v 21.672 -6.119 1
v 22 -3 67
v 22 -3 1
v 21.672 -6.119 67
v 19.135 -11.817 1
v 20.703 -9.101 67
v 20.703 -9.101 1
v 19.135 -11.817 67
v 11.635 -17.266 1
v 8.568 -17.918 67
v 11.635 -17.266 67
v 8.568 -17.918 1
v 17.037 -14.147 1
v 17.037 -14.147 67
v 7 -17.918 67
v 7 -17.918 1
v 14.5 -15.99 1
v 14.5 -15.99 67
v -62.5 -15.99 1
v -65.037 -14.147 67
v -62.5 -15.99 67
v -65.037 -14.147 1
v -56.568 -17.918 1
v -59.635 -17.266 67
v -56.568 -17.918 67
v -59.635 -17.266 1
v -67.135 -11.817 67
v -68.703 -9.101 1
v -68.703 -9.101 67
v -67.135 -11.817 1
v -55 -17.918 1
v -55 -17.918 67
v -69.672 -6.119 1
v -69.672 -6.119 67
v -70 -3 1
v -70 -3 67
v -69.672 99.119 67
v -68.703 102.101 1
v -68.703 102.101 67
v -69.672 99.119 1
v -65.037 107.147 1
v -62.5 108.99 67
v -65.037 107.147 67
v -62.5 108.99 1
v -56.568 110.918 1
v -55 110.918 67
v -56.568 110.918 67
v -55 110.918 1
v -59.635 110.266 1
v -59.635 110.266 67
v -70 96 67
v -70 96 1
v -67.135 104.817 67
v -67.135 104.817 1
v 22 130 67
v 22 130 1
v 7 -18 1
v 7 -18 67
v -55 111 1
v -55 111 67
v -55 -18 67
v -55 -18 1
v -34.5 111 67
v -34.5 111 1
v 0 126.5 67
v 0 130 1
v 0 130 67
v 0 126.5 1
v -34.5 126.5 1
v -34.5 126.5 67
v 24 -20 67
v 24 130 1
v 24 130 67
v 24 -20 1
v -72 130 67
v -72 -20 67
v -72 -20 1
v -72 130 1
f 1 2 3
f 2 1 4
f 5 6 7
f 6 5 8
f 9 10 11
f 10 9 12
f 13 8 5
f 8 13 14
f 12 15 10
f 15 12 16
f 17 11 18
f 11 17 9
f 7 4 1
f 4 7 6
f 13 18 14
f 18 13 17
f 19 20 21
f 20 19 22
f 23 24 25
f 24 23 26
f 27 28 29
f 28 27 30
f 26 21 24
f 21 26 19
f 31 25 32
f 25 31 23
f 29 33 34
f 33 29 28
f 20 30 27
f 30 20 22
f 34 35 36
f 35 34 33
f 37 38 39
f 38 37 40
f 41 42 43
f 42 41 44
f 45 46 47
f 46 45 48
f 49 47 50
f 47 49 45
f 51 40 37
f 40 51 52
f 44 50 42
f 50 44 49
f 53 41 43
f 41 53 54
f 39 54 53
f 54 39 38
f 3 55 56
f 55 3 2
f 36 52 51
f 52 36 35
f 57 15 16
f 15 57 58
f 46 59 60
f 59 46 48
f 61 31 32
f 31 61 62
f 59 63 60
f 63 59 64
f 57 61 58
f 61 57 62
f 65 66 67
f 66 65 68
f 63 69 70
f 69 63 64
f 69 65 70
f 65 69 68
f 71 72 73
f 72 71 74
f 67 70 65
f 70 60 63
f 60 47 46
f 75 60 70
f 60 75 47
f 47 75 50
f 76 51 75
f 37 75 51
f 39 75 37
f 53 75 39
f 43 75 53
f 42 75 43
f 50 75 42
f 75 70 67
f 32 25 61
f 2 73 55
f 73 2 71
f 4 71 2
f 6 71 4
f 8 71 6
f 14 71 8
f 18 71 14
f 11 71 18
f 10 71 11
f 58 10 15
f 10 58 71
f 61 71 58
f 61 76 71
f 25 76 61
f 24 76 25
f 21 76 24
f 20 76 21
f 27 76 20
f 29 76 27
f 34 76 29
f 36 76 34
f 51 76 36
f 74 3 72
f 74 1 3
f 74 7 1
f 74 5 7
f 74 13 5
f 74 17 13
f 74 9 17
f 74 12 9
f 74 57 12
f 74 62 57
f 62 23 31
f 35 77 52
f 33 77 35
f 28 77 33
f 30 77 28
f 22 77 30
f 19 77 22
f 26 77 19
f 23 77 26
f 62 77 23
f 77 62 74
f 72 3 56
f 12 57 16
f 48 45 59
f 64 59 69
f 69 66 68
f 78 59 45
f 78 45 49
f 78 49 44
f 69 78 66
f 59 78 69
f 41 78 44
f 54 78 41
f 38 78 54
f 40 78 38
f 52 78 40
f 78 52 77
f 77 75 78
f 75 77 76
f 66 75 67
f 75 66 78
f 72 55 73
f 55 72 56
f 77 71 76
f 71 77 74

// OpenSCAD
// file: duct.scad
WALL_SIZE = .5;
RADIUS = 3;
DEFAULT_SIZE = [10, 10];
RRR = 0;
LAYER_HEIGHT = 0.2;

module reinforcementsLeft(size, radius, wallSize, parts = [1, 1]) {
  diameter = radius * 2;
  halfRadius = radius / 2;

  r = radius * 4;
  d1 = -halfRadius;
  d2 = -halfRadius;
  d3 = size[1] - r + halfRadius;
  
  if (parts[0])
    translate([d1, d2, 0])
      circle(d = radius * 4, $fn = 32);
      
  if (parts[1])
    translate([d1, d3, 0])
      circle(d = radius * 4, $fn = 32);
}

module reinforcementsRight(size, radius, wallSize, parts = [1, 1]) { 
  diameter = radius * 2;
  r = radius * 4;
  halfRadius = radius / 2;
  d2 = size[0] - r + halfRadius;
  d3 = size[1] - r + halfRadius; 
  d4 = -halfRadius;

  if (parts[0])
    translate([d2, d4, 0])
      circle(d = radius * 4, $fn = 32);
  
  if (parts[1])
    translate([d2, d3, 0])
      circle(d = radius * 4, $fn = 32);        
}

module reinforcements(size, radius, wallSize, parts = [1, 1, 1, 1]) {
  reinforcementsLeft(size, radius, wallSize, [parts[0], parts[1]]);
  reinforcementsRight(size, radius, wallSize, [parts[2], parts[3]]);
}

module duct2dEdge(
  size = DEFAULT_SIZE, 
  wallSize = WALL_SIZE, 
  radius = RADIUS, 
  outer = false, 
  parts = [1,1,1,1]
) {
  sizeX = size[0] + (outer ? wallSize * 2 : 0);
  sizeY = size[1] + (outer ? wallSize * 2 : 0);
  r = radius + (outer ? wallSize : 0);
  
  translate([sizeX / -2 + r * 2, sizeY / -2 + r * 2, 0]) {
    minkowski() {
      square([sizeX - (r * 2), sizeY - (r * 2)]);
      
      translate([-r, -r, 0])
        circle(r, $fn = 64);
    }
   
    if (outer) reinforcements([sizeX, sizeY], r, wallSize, parts = parts);
  }
}

module duct2d(
  size = DEFAULT_SIZE,
  wallSize = WALL_SIZE, 
  radius = RADIUS
) {
  difference() {
    duct2dEdge(
      size,
      wallSize,
      radius,
      outer = true
    );
    
    duct2dEdge(
      size, 
      wallSize,
      radius
    );
  }
}

module coupling2d(size = [10, 10], wallSize = WALL_SIZE, radius = RADIUS, inset = 0) {
  offset(r = -0.1) difference() {
      *duct2dEdge(
        [
          size[0] + wallSize * 2 + radius * 2.5, 
          size[1] + wallSize * 2 + radius * 2.5
        ], 
        wallSize,
        radius
      );
      
      duct2dEdge(
        [
          size[0] + wallSize * 2 - inset, 
          size[1] + wallSize * 2 - inset
        ], 
        wallSize,
        radius + wallSize,
        outer = true
      );
    }
}

module coupling(size = [10, 10], wallSize = WALL_SIZE, radius = RADIUS, h = 4) {
    split = 0.6;
    partHeight = (h - (LAYER_HEIGHT * 4)) / 2;

    difference() {
      linear_extrude(h) 
        offset(2) 
          coupling2d(size, wallSize, radius);
   
      translate([0, 0, -0.1])
        linear_extrude(partHeight + 0.2)
          coupling2d(size, wallSize, radius + 0.2);
       
      translate([0, 0, partHeight - 0.1]) 
        linear_extrude(LAYER_HEIGHT * 1 + 0.2)
          offset(-0.2)
            coupling2d(size, wallSize, radius + 0.2);
      
      translate([0, 0, partHeight - 0.1 + LAYER_HEIGHT]) 
        linear_extrude(LAYER_HEIGHT * 2 + 0.2)
          offset(-0.4)
            coupling2d(size, wallSize, radius + 0.2);
      
      translate([0, 0, partHeight + LAYER_HEIGHT + LAYER_HEIGHT + LAYER_HEIGHT - 0.1]) 
        linear_extrude(LAYER_HEIGHT * 1 + 0.2)
          offset(-0.2)
            coupling2d(size, wallSize, radius + 0.2);

      
      translate([0, 0, partHeight + (LAYER_HEIGHT * 4) - 0.1])
        linear_extrude(partHeight + (LAYER_HEIGHT * 4) + 0.1)
          coupling2d(size, wallSize, radius + 0.2);
    }
}

module ductTaper(
  startSize = DEFAULT_SIZE, 
  endSize = [DEFAULT_SIZE[0] - 2, DEFAULT_SIZE[1] - 2], 
  wallSize = WALL_SIZE, 
  radius = RADIUS, 
  h = 10,
  yPlus = 12,
  parts = [1,1,1,1]
) {
  upperY = startSize[1] / 2 - endSize[1] / 2;

  difference() {
    union() {
      intersection() {
        union() {
          linear_extrude(h)
            duct2dEdge(
              [
                startSize[0], 
                startSize[1]
              ],
              wallSize,
              radius + wallSize,
              outer = true,
              parts = parts
            );
        }
          
        hull() {
          translate([0, 0, -0.1]) 
            linear_extrude(0.2) 
              offset(2)
                duct2dEdge(startSize, wallSize, radius, parts);
          
          translate([0, upperY - yPlus / 2, h - 0.1]) 
            linear_extrude(0.2) 
              offset(2) 
                duct2dEdge(
                  [endSize[0], endSize[1] + yPlus], 
                  wallSize, 
                  radius - wallSize * 4,
                parts
                );
        }  
      }
        
      children();
    }
    
    hull() {
      translate([0, 0, -0.1]) 
        linear_extrude(0.2) duct2dEdge(startSize, wallSize, radius);
      
      translate([0, startSize[1] / 2 - endSize[1] / 2 - radius * .5, h - 0.1]) 
        linear_extrude(0.2) duct2dEdge(endSize, wallSize, radius);
    }
   
  } 

  translate([0,endSize[1] - radius * 2.5 + WALL_SIZE * 2, h])
    linear_extrude(5)
      duct2d(
        [
          endSize[0], 
          endSize[1]
        ],
        wallSize,
        radius,
        outer = true
      );
}

   
group() {

  translate([0, 32, 0]) {
    coupling([50, 20]);
    *coupling([40, 10]);
  }
  
  *translate([0, 0, 0]) {
    hull() {
      linear_extrude(1) 
        duct2d([40, 10]);
      
      translate([0, 5, 20]) linear_extrude(1) 
        duct2d([50, 20]);
    }
  }

  translate([0, -32, 0]) {
    rotate([0,0,0]) linear_extrude(8) duct2d([50, 40]);
  }
  
  *translate([0, -25, 0]) {
    linear_extrude(6) duct2d([50, 20]);
  }
  
  group() {
    ductTaper([50, 20], [40, 10], h = 15);
  }
  
  *translate([0, -30, -10]) 
    linear_extrude(15) duct2d([50 - WALL_SIZE * 2, 20 - WALL_SIZE * 2]);

  *translate([0, 25, -10]) 
    linear_extrude(15) duct2d([40 + WALL_SIZE * 2, 10 + WALL_SIZE * 2]);

  *  duct2d([50, 10]);
  *  translate([0,0,20]) duct2d([50, 10]);

  *square([50, 10], center = true);
}
// main file
use <./duct.scad>;
CORNER_RADIUS = 20;
WALL_SIZE = .5;
RADIUS = 3.5;
DEFAULT_SIZE = [10, 10];
SOLID = true;
WIDTH = 40;
HEIGHT = 20;
T_WIDTH = 5;
LW = 0.4;

FAN_SIZE = [92, 92, 18];
MAIN_SIZE = [105, 126, 34];
SINK_SIZE = [59, 67, 20];
SINK_Y = (MAIN_SIZE[1] - SINK_SIZE[1]) / 2;
SINK_Z = 5;
BASE_SIZE = [
  MAIN_SIZE[1],
  FAN_SIZE[2] + MAIN_SIZE[2] + SINK_SIZE[2]
];

echo(BASE_SIZE);

*group() {
  color("blue") 
    translate([-MAIN_SIZE[2], (MAIN_SIZE[1] - FAN_SIZE[1]) / 2, 5]) 
      rotate([0, 270, 0])
        cube(FAN_SIZE);
  
  color("silver")
    translate([SINK_SIZE[2], SINK_Y, SINK_Z]) 
      rotate([0, 270, 0])
        cube(SINK_SIZE);
  
  color("gray") 
      rotate([0, 270, 0]) 
        cube(MAIN_SIZE);
}

PADDING = 4;
HALF_PAD = PADDING / 2;
Y_GAP = 16;
FAN_X_GAP = 16;
CH = SINK_SIZE[0] + SINK_Z + PADDING;
CR = 15;

difference() {
  translate([
    -BASE_SIZE[1] + SINK_SIZE[2] - PADDING - FAN_X_GAP, 
    (BASE_SIZE[0] - MAIN_SIZE[1]) / -2 - PADDING - Y_GAP, 
    1
  ])
    cube([
      BASE_SIZE[1] + PADDING * 2 + FAN_X_GAP, 
      BASE_SIZE[0] + PADDING * 2 + Y_GAP, 
      CH - 2
    ]);

  union() {
    translate([
      SINK_SIZE[2] - CR + HALF_PAD, 
      CR - HALF_PAD -Y_GAP, 
      0
    ])
        cylinder(CH, d = CR * 2);
      
    translate([
      -MAIN_SIZE[0] + CR * 2 + PADDING + FAN_X_GAP, 
      CR - HALF_PAD -Y_GAP, 
      0
    ])
        cylinder(CH, d = CR * 2);
        
    translate([
      -MAIN_SIZE[0] + CR * 2 + PADDING + FAN_X_GAP, 
      MAIN_SIZE[1] - CR * 2, 
      0
     ])
      cylinder(CH, d = CR * 2);

    translate([
      -BASE_SIZE[1] + HALF_PAD, 
      -Y_GAP - HALF_PAD + CR, 
      0
    ])
      cube([
        BASE_SIZE[1] + PADDING + FAN_X_GAP, 
        BASE_SIZE[0] - Y_GAP - CR + PADDING, 
        CH
      ]);

        
    translate([
      -BASE_SIZE[1] + HALF_PAD + CR, 
      -Y_GAP - HALF_PAD, 
      0
    ])
      cube([
        BASE_SIZE[1] + PADDING + FAN_X_GAP - CR * 2, 
        BASE_SIZE[0] + Y_GAP - CR + PADDING / 2, 
        CH
      ]);
     
    cube([
      SINK_SIZE[2] + PADDING / 2, 
      BASE_SIZE[0] + PADDING + 0.1, 
      CH
    ]);
    
    translate([-MAIN_SIZE[2] - 0.5, 0.5, 0])
    cube([
      SINK_SIZE[2] + MAIN_SIZE[2] + PADDING / 2, 
      BASE_SIZE[0], 
      CH
    ]);
    
    translate([-1, SINK_Y - 1, -20]) 
      cube([
        SINK_SIZE[2] + 2, 
        SINK_SIZE[1] + 2, 
        SINK_SIZE[0]
      ]);
  }
}

*linear_extrude(MAIN_SIZE[1])
  ductSpiral(BASE_SIZE, CORNER_RADIUS, texture = true);
  
*ductTaper(
  BASE_SIZE, 
  10,
  CORNER_RADIUS
);

*rotate([0, 180, 0])
  translate([-BASE_SIZE[0], 0, -MAIN_SIZE[1]])
    ductTaper(
      BASE_SIZE, 
      10,
      CORNER_RADIUS
    );

module ductTaper(
  size = [WIDTH, HEIGHT], 
  h = 5, 
  th = 25,
  r = CORNER_RADIUS, 
  texture = false, 
  offset = LW * 2) 
{
  difference() {
    hull() {
      linear_extrude(h) 
        offset(offset) 
          ductSpiral(size, r, texture);
      
      translate([0, 0, h])
        linear_extrude(th) 
          offset(-3) 
            ductSpiral(size, r, texture);
    }
  }
}



curveScale = 0.13;
curveHeight = 40;
curveY = -3;

module dShape(
  d = 100,
  tY = curveY, 
  s1t = [-60, -115], 
  s2t = [-50, 47], 
  s1 = false, 
  s2 = false,
  $fn = 8
) {
  translate([0, tY, 0]) {
    difference() {
      circle(d = d, $fn = $fn);
      translate(s1t) square(abs(s1t[0] * 2));
      translate(s2t) square(s2 == false ? 100 : s2);
    }      
  }
}


module dTaper(d = 108, h = 40, s1t = false, s2t = false, topT = 0, fn = 16) {
  hull() {
    linear_extrude(1) {
      if (s1t == false && s2t == false) {
        dShape(d, $fn = fn);  
      } else {
        dShape(d, s1t = s1t, s2t = s2t, $fn = fn);  
      }
    }
    
    translate([(d / -2) + 20, topT, h - 1]) 
      linear_extrude(1) 
        square([d - 40, 3]);
  }
}

module fc() {
    // BOTTOM COUPLING
  linear_extrude(8) {
    diameter = RADIUS * 2;
    twoWall = WALL_SIZE * 2;
    
    difference() {
      // BOTTOM OUTER WALL
      union() {
        duct2dEdge([110, 50], WALL_SIZE, RADIUS, outer = true);      
        dShape(104, $fn = 16);
      }
      
      // BOTTOM INNER WALL
      group() {
        translate([0, RADIUS * -2 - WALL_SIZE + 7.5, 0]) {
          duct2dEdge([110, 50], WALL_SIZE, RADIUS);
        }

        dShape(99, curveY, [-50, -100], [-50, 44.5], s2 = [100, 22], $fn = 128);
      }
    }
  }
}


module fanCoupling() {
  fc();

  // TAPER
  translate([0, 0, 5]) {
    twoWall = WALL_SIZE * 2;
    
    // OUTER SHELL
    union() {
      rotate([0, 0, 180]) 
        translate([twoWall - 1, twoWall - 1, 0])
          ductTaper(
            [110, 50],  
            [80, 20],
            wallSize = WALL_SIZE,
            radius = 3,
            h = curveHeight,
            parts = [0,0,0,0]
          ) {
      
            // D TAPER
            rotate([0,0,180]) {
              linear_extrude(4) dShape(104, $fn = 16);
              translate([0,0, 4]) dTaper(104, 36, $fn = 8);
              
              linear_extrude(15) 
                translate([-55 + 7 + WALL_SIZE, -25 + 7 + WALL_SIZE, -5]) 
                  reinforcements(
                    [110 + WALL_SIZE * 2, 50 + WALL_SIZE* 2], 
                    3 + WALL_SIZE * 2, 
                    WALL_SIZE
                  );
            }
            
          }
    }
  }

  translate([20, 33, 0]) cylinder(5, d = 13);
  translate([00, 33, 0]) cylinder(5, d = 13);
  translate([-20, 33, 0]) cylinder(5, d = 13);
}

module defrostVent2d(wallSize = WALL_SIZE, solid = SOLID) {
  offset = 10;
  v1 = 30;
  v1y = 92 + offset;
  v2 = 60;
  v3y = 92 + offset;
  
  translate([0, 80, 0]) {
    translate([0, 0, 0]) {
      difference() {
        translate([-wallSize, -wallSize, 0]) 
          square([v1 + wallSize * 2, v1y + wallSize * 2]);

        if (!solid) translate([0, -wallSize * 2]) square([v1, v1y + wallSize * 2]);
      }

      translate([v1, 0, 0])
        difference() {
          difference() {
            circle(r = v1 + wallSize, $fn = 64);
            if (!solid) circle(r = v1, $fn = 64);
          }
          
          translate([-v1 - 10, 0]) square([v1 * 2 + 20, v1 * 2]);
          translate([wallSize, -v1 - 10]) square([v1 * 2, v1 * 2 + 20]);
        }
      }
    
    translate([v1 + wallSize, 0, 0]) {
      if (solid) {
        translate([0, -v1 - wallSize, 0]) square([v2, v1 + wallSize]);
      } else {
        translate([0,-wallSize,0]) square([v2, wallSize]);
        translate([0,-v1 - wallSize,0]) square([v2, wallSize]);
      }
    }
    
    translate([v1 + v2 + wallSize * 2, 0, 0]) {
      difference() {
        difference() {
          circle(r = v1 + wallSize, $fn = 64);
          if (!solid) circle(r = v1, $fn = 64);
        }
        
        translate([-35, 0]) square([70, 40]);
        translate([-40 - wallSize, -35]) square([40, 70]);
      }
      
      difference() {
        translate([-wallSize, -wallSize, 0]) 
          square([v1 + wallSize * 2, v3y + wallSize * 2]);

        if (!solid) translate([0, -wallSize * 2]) square([v1, v3y + wallSize * 2 + 5]);
      }
    }
  }
}







  

*fanCoupling();
*fc();
*defrostVent2d();

*linear_extrude(10) union() {
      duct2dEdge([110, 50], WALL_SIZE, RADIUS, outer = true, parts = [0,0,0,0]);      
      dShape(104, $fn = 16);
    }
    
*group() {
  hull() {
    linear_extrude(10) 
      union() {
        duct2dEdge([110, 50], WALL_SIZE, RADIUS, outer = true, parts = [0,0,0,0]);      
        dShape(104, $fn = 16);
      }
      
      translate([-46, -10, 40])
      rotate([-30, 0, 0])
      linear_extrude(5) 
        ductSpiral([92, 36]);
  *      duct2dEdge([110, 50], WALL_SIZE, RADIUS, outer = true, parts = [0,0,0,0]);      
  }
   
       translate([-46, -10, 40]) rotate([-30, 0, 0]) translate([0,0,5]) {
          difference() {
            linear_extrude(40) ductSpiral([92, 36]);  
            linear_extrude(45) offset(-0.4) ductSpiral([92, 36]);  
          }
        }  
}



module ductSpiral(
  size = [WIDTH, HEIGHT], 
  r = CORNER_RADIUS, 
  texture = false
) {
  w = size[0];
  h = size[1];
  
  width = w - r;
  height = h - r;
  
  difference() {
    union() {
      for (x = [r, width])
        for (y = [r, height])
          translate([x, y])
            circle(r, $fn = 64);
        
      translate([0, r])
        square([w, h - r * 2]);
      
      translate([r, 0])
        square([w - r * 2, h]);    
    }
    
    if (texture) {
      wMax = w - r;
      hMax = h - r;
 
      xSize = 4;
      xSegments = floor((width - r) / xSize);
      xCount = xSegments % 2 == 0 ? 
        xSegments - 1 : 
        xSegments;
      
      xRatio = (width - r) / (xCount * 180);
      
      ySize = 4;
      ySegments = floor((height - r) / ySize);
      yCount = ySegments % 2 == 0 ? 
        ySegments - 1 : 
        ySegments;
      yRatio = (height - r) / (yCount * 180);
      
      echo(xCount, yCount);
      
      for (y = [0, 1])
        translate([r, .5 - y + h * y])
          mirror([0, y - 1, 0])
            polygon([
              [0, 2],
              for (t = [90 : 30 : xCount * 180 - 90])
                [t * xRatio, sin(t) / 2],
              [width - r, 2]
            ]);


      for(x = [0, 1])
        translate([.5 - x + w * x, r])
          mirror([x - 1, 0])
            polygon([
              [2, 0],
              for (t = [90 : 30 : yCount * 180 - 90])
                [sin(t) / 2, t * yRatio],
              [2, height - r]
            ]);
    }
  }
}
